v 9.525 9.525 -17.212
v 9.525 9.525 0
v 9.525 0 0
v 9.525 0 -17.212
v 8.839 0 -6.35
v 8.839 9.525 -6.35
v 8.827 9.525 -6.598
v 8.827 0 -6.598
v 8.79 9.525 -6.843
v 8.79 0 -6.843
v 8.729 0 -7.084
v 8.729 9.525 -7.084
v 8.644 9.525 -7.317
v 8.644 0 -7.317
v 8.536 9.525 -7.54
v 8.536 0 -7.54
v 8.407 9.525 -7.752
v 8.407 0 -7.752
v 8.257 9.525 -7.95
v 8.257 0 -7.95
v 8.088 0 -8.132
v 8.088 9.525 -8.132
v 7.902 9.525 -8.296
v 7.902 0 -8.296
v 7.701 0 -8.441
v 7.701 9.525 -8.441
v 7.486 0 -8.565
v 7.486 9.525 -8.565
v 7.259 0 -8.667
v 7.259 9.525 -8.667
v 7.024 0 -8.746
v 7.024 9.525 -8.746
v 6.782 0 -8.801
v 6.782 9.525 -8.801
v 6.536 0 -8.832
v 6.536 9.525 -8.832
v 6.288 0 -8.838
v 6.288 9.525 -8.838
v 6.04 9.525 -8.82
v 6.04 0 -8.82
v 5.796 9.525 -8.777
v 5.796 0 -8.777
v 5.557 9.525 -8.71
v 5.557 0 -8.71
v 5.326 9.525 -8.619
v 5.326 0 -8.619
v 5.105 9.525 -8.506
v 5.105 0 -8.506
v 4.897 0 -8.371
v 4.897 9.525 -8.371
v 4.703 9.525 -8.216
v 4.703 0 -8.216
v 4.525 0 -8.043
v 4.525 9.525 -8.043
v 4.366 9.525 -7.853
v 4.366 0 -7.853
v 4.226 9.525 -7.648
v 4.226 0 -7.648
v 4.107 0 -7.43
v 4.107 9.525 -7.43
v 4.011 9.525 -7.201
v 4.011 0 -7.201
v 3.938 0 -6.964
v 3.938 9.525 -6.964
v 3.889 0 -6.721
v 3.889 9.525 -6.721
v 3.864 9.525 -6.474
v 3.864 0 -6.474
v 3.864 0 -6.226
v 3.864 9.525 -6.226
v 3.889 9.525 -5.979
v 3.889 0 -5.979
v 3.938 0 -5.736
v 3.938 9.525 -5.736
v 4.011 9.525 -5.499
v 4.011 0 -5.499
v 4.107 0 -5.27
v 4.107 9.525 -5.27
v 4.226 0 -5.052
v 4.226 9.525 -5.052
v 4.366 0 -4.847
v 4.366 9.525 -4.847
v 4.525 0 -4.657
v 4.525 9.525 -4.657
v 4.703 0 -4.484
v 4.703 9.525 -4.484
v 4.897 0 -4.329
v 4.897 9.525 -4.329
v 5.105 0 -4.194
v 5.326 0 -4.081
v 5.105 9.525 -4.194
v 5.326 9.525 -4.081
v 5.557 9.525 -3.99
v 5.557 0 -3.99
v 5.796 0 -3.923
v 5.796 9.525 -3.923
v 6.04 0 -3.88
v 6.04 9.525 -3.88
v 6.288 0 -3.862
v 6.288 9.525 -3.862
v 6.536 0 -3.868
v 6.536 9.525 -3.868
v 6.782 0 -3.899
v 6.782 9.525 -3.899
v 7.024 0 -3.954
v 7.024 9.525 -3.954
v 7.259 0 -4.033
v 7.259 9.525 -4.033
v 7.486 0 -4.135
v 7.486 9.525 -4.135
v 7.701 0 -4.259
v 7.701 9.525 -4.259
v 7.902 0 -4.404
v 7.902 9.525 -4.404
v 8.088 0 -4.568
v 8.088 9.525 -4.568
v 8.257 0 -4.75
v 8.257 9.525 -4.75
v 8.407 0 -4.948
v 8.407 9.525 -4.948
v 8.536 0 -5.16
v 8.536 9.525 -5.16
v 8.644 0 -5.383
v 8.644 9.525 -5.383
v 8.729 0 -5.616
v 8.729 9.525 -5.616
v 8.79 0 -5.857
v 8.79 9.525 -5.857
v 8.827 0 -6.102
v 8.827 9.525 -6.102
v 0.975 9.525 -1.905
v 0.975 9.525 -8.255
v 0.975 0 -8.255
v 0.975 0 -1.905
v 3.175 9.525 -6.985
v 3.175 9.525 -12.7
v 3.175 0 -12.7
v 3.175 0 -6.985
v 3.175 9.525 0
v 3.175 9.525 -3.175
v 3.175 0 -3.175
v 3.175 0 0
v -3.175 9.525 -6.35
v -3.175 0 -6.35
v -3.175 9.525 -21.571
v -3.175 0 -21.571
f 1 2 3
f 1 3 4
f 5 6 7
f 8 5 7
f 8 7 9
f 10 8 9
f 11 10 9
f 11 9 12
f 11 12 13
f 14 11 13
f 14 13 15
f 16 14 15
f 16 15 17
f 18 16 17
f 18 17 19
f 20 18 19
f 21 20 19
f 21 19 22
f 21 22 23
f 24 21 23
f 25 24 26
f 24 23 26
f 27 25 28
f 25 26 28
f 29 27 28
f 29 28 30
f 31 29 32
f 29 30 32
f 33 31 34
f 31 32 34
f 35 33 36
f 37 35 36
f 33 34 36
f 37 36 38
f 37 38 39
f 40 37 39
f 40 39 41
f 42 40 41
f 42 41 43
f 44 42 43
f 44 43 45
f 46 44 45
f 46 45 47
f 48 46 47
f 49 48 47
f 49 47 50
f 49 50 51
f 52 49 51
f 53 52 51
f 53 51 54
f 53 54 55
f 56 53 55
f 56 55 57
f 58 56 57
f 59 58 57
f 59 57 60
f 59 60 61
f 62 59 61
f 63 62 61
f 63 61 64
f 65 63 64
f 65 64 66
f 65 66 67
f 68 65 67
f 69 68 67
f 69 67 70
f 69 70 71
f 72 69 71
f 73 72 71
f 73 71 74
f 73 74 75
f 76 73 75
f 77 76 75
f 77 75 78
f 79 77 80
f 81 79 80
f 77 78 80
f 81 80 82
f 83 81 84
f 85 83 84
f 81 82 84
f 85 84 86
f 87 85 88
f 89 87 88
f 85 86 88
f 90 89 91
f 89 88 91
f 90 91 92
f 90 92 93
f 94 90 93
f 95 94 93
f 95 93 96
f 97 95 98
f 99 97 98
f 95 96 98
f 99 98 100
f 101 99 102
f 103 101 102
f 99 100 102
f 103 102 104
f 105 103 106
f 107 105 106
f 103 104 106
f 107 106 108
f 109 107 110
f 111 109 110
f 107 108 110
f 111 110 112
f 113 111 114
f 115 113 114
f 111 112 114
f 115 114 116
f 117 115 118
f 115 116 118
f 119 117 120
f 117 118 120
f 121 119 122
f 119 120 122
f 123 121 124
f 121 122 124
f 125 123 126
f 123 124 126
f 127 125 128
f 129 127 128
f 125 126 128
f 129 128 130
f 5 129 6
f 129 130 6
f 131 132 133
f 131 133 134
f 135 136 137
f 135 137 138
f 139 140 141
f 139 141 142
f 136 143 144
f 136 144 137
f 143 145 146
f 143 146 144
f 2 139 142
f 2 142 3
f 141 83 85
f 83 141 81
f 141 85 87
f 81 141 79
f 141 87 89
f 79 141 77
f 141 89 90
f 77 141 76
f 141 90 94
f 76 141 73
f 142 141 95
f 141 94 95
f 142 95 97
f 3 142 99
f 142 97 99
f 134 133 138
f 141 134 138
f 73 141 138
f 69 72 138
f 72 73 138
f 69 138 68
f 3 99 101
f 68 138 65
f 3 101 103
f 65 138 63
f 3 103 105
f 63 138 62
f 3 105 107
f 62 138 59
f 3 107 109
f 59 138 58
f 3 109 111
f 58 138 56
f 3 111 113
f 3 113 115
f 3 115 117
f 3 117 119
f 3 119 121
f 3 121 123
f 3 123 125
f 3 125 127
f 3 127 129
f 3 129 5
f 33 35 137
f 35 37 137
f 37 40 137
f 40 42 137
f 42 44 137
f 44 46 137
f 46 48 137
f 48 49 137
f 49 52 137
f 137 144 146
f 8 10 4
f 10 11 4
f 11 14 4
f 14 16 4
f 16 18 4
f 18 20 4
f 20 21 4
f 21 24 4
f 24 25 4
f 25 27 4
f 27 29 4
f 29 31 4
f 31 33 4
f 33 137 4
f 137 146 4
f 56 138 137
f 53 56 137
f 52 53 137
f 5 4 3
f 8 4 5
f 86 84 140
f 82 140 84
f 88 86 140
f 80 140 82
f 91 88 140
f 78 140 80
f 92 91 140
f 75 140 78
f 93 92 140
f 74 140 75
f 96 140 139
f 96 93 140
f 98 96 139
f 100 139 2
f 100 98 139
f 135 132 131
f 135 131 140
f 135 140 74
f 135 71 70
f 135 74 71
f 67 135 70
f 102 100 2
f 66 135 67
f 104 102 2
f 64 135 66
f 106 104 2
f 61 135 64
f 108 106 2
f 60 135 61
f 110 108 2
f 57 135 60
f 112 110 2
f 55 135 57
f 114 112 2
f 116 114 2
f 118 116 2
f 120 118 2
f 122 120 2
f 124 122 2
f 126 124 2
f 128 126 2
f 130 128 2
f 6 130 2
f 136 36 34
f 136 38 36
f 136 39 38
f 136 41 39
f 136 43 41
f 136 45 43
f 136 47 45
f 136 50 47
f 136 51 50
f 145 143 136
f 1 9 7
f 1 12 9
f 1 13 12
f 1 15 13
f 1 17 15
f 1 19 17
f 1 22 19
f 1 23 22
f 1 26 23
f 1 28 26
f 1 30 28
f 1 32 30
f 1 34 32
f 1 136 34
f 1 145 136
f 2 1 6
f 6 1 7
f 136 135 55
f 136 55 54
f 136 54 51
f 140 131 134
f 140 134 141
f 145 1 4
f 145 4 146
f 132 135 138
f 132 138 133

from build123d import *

# Parameters (mm, degrees)
SKETCH2_R               = 2.4892
BOSS_EXTRUDE3_DEPTH     = 9.525
SKETCH3_R               = 2.4892
BOSS_EXTRUDE4_DEPTH     = 9.525
SKETCH4_W               = 12.7
SKETCH4_H               = 1.27
BOSS_EXTRUDE5_DEPTH     = 9.525
SKETCH5_R               = 2.4892
CUT_EXTRUDE1_DEPTH      = 1
CUT_EXTRUDE1_DEPTH_BACK = 10.525
BOSS_EXTRUDE7_DEPTH     = 9.525


with BuildPart() as part:
    # Sketch2 → Boss-Extrude3 (new body)
    with BuildSketch(Plane(origin=(0, 0, 0), x_dir=(1, 0, 0), z_dir=(0, 1, 0))):
        with Locations((6.35, 6.35)):
            Circle(SKETCH2_R)
    extrude(amount=BOSS_EXTRUDE3_DEPTH)

    # Sketch3 → Boss-Extrude4 (add)
    with BuildSketch(Plane(origin=(0, 9.525, 0), x_dir=(1, 0, 0), z_dir=(0, 1, 0))):
        Polygon((9.525, 12.7), (3.175, 12.7), (3.175, 6.985), (0.975295474, 8.255), (0.975295474, 1.905), (3.175, 3.175), (3.175, 0), (9.525, 0), align=None)
        with Locations((6.35, 6.35)):
            Circle(SKETCH3_R, mode=Mode.SUBTRACT)
        Polygon((-3.175, 12.7), (-3.175, 6.35), (3.175, 12.7), align=None)
    extrude(amount=-BOSS_EXTRUDE4_DEPTH)

    # Sketch4 → Boss-Extrude5 (add)
    with BuildSketch(Plane(origin=(0, 9.525, 0), x_dir=(1, 0, 0), z_dir=(0, 1, 0))):
        with Locations((3.175, 13.335)):
            Rectangle(SKETCH4_W, SKETCH4_H)
    extrude(amount=-BOSS_EXTRUDE5_DEPTH)

    # Sketch5 → Cut-Extrude1 (cut, two sides)
    with BuildSketch(Plane(origin=(0, 9.525, 0), x_dir=(1, 0, 0), z_dir=(0, 1, 0))) as cut_extrude1_sk:
        with Locations((6.35, 6.35)):
            Circle(SKETCH5_R)
    extrude(amount=CUT_EXTRUDE1_DEPTH, mode=Mode.SUBTRACT)
    extrude(cut_extrude1_sk.sketch, amount=-CUT_EXTRUDE1_DEPTH_BACK, mode=Mode.SUBTRACT)

    # Sketch7 → Boss-Extrude7 (add)
    with BuildSketch(Plane(origin=(0, 9.525, 0), x_dir=(1, 0, 0), z_dir=(0, 1, 0))):
        Polygon((9.525, 13.97), (9.525, 17.212483646), (-3.175, 21.571193519), (-3.175, 13.97), align=None)
    extrude(amount=-BOSS_EXTRUDE7_DEPTH)


solid = part.part
